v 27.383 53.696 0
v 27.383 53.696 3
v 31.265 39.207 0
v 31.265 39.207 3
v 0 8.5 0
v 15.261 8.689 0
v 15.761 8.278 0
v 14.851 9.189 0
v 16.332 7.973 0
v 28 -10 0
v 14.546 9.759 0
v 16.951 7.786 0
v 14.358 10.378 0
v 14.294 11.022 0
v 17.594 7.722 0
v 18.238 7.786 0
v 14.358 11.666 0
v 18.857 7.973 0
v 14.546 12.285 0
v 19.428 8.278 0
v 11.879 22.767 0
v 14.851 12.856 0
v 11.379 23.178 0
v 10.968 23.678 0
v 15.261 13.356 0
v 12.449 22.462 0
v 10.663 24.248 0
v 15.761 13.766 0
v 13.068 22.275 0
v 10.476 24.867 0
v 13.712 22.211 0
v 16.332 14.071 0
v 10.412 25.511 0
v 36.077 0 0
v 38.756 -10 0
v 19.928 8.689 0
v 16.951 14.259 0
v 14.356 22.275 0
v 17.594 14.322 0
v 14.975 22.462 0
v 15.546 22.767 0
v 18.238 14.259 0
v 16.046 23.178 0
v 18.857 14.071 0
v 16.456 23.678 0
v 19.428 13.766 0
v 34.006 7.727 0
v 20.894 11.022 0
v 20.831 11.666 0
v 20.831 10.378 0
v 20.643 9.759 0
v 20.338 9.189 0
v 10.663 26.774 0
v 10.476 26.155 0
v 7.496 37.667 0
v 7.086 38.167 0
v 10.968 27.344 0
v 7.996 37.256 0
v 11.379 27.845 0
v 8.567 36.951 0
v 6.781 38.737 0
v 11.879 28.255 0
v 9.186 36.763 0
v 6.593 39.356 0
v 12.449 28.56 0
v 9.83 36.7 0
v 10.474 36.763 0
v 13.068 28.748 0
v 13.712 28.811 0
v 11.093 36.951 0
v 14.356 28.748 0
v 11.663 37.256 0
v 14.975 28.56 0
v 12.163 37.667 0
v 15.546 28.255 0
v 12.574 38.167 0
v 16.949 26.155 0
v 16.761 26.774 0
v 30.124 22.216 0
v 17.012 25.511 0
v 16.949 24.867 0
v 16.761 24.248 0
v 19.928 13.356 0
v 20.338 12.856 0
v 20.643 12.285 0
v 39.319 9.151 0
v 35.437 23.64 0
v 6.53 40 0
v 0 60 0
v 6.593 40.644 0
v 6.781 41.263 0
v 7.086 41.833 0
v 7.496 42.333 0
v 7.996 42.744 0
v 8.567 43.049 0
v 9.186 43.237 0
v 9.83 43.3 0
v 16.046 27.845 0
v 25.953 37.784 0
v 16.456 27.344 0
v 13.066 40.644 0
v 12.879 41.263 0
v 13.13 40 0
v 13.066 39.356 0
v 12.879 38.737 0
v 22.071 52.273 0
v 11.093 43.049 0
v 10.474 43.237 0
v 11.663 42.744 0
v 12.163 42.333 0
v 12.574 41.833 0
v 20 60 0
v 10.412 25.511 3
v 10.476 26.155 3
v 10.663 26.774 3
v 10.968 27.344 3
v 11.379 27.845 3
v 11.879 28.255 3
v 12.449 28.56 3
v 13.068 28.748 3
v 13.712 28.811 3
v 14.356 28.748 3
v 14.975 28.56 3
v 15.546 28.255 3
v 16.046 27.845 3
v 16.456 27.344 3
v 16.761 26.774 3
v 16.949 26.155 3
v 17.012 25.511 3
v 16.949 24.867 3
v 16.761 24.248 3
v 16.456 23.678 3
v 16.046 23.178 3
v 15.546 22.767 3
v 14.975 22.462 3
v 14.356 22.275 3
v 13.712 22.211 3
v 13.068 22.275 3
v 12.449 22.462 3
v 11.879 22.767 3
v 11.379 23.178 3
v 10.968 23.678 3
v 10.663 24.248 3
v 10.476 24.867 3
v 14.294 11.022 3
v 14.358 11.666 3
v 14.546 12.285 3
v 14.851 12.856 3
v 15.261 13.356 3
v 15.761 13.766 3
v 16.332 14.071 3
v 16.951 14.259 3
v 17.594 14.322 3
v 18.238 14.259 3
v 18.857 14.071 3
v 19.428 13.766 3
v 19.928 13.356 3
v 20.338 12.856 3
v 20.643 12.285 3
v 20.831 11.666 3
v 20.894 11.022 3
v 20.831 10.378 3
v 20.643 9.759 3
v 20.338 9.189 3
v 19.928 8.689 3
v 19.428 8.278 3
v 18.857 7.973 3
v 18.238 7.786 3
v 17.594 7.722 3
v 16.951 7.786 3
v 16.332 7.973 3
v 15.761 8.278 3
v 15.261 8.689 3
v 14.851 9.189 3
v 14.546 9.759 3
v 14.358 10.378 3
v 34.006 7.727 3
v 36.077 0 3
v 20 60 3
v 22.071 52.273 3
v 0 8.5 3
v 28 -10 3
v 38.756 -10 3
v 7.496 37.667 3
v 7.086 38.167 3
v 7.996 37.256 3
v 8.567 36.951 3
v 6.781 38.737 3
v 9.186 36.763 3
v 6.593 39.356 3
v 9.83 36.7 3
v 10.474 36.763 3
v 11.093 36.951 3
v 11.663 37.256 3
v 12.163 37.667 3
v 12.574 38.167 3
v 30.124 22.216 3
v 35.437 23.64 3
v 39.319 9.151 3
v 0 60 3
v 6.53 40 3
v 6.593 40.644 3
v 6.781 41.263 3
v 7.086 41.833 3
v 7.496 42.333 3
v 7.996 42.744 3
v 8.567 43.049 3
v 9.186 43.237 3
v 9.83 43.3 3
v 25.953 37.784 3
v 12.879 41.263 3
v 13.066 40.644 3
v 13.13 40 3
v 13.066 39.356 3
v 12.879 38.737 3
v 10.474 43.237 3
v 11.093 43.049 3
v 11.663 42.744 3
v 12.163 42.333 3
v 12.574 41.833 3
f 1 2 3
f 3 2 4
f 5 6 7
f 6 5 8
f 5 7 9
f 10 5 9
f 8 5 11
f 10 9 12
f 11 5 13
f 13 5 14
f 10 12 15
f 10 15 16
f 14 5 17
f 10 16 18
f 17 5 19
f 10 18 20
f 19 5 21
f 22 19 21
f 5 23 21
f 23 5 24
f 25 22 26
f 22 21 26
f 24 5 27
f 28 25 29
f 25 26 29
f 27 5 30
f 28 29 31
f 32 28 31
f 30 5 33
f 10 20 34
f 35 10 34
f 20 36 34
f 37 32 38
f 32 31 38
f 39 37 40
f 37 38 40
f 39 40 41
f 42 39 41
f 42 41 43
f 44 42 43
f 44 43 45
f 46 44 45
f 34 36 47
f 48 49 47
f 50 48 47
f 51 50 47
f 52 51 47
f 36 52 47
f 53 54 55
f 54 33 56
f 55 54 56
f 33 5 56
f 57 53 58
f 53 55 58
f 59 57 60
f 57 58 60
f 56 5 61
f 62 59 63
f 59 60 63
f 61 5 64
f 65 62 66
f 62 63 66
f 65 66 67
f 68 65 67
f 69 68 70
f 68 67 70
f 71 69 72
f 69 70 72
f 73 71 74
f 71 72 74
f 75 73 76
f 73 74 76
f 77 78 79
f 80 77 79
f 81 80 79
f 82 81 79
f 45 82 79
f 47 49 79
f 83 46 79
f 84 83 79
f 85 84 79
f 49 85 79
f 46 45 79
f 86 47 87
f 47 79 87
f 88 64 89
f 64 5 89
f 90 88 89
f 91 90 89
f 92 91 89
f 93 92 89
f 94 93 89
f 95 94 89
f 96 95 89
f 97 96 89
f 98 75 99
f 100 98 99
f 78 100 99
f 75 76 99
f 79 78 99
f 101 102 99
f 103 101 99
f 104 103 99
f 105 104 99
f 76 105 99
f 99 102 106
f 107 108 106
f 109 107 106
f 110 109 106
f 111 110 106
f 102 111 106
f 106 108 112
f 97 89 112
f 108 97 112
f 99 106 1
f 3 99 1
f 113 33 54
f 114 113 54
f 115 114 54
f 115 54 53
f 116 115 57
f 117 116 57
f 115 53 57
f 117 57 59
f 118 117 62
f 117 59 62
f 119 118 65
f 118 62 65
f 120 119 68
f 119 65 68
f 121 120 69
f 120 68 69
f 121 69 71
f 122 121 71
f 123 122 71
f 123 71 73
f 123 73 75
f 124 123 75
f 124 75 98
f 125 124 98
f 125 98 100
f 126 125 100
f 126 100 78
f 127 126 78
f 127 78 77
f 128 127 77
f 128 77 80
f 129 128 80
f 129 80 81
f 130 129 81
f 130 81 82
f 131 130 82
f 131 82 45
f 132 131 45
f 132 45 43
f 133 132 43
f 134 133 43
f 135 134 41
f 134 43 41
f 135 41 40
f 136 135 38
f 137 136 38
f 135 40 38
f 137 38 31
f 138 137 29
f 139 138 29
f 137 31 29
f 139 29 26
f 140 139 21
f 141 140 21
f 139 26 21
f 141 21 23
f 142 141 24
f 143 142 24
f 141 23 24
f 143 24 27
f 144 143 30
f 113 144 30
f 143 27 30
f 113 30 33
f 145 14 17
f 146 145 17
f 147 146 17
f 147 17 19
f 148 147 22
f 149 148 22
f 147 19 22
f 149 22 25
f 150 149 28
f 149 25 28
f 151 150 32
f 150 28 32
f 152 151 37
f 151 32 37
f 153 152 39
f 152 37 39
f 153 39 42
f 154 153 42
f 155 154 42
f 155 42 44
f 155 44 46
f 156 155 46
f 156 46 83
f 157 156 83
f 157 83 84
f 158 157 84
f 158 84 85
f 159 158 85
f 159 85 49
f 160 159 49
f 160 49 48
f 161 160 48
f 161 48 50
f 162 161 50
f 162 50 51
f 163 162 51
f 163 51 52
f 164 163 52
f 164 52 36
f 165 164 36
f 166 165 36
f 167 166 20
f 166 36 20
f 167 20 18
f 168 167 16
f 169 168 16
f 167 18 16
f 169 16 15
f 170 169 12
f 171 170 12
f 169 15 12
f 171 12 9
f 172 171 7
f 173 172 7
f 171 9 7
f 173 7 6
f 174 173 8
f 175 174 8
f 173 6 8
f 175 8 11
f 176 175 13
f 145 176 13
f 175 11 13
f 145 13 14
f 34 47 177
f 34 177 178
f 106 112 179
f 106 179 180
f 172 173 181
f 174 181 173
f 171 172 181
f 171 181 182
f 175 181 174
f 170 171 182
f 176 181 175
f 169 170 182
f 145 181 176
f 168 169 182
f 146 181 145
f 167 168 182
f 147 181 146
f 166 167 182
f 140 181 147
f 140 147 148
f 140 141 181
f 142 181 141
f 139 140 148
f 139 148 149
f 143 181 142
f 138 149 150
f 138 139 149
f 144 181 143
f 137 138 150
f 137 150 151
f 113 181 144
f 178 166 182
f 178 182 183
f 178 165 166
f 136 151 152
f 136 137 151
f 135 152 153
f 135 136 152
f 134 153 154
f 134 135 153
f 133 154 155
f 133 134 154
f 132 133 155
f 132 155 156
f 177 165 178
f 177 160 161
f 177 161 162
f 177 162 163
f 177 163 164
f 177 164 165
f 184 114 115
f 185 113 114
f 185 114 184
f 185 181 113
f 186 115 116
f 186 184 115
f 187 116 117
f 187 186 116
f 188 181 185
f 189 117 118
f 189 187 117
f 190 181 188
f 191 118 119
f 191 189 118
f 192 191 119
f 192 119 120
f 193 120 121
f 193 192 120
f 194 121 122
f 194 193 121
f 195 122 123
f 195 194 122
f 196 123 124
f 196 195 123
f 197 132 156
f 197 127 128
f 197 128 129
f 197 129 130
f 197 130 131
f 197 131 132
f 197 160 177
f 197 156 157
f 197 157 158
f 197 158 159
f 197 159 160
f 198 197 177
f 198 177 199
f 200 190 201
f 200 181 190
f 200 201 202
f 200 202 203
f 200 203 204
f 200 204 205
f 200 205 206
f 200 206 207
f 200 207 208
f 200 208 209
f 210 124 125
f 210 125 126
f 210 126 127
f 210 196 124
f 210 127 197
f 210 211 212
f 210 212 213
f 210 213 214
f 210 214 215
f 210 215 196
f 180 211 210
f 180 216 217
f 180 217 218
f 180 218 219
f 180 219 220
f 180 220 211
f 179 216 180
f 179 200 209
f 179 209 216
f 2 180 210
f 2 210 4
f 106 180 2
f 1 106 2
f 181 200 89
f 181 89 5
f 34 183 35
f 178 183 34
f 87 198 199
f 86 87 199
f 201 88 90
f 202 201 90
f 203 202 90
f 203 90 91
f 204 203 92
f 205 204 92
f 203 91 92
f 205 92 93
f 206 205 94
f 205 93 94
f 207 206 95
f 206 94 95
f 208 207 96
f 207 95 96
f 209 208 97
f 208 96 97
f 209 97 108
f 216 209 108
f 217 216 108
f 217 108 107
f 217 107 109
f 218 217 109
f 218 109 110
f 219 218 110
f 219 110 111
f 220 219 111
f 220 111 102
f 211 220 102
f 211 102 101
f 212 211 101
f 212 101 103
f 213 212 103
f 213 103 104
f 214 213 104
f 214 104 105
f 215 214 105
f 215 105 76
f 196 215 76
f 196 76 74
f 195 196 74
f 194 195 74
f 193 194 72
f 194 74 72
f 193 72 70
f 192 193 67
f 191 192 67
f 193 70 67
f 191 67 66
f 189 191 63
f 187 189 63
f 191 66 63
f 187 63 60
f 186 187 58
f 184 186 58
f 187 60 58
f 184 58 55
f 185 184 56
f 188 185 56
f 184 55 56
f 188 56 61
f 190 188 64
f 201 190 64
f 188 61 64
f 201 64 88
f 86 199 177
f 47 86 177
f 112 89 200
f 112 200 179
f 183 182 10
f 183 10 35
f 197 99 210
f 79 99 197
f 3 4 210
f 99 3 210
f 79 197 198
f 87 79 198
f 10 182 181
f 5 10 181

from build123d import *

# Parameters (mm, degrees)
RESSALTO_EXTRUS_O1_DEPTH = 3
FURO_COM_FOLGA_DE_M61_D  = 6.6
RESSALTO_EXTRUS_O2_DEPTH = 3
RESSALTO_EXTRUS_O3_DEPTH = 3
CORTE_EXTRUS_O1_DEPTH    = 72.798210781


with BuildPart() as part:
    # Esboço1 → Ressalto-extrusão1 (new body)
    with BuildSketch(Plane.XY):
        Polygon((0, 0), (0, 60), (20, 60), (36.076951546, 0), align=None)
    extrude(amount=RESSALTO_EXTRUS_O1_DEPTH)

    # Furo com folga de M61 (through all)
    with Locations(Plane.XY.offset(3)):
        with Locations((9.829841142, 40), (13.712126819, 25.511112606), (17.594412496, 11.022225211)):
            Hole(FURO_COM_FOLGA_DE_M61_D / 2)

    # Esboço4 → Ressalto-extrusão2 (add)
    with BuildSketch(Plane.XY.offset(3)):
        Polygon((22.070552361, 52.27259339), (27.383144405, 53.696098138), (31.265430082, 39.207210743), (25.952838037, 37.783705995), align=None)
        Polygon((30.124113509, 22.216294005), (35.436705553, 23.639798753), (39.31899123, 9.150911358), (34.006399185, 7.72740661), align=None)
    extrude(amount=-RESSALTO_EXTRUS_O2_DEPTH)

    # Esboço5 → Ressalto-extrusão3 (add)
    with BuildSketch(Plane.XY.offset(3)):
        Polygon((0, 0), (0, -10), (38.75644347, -10), (36.076951546, 0), align=None)
    extrude(amount=-RESSALTO_EXTRUS_O3_DEPTH)

    # Esboço6 → Corte-extrusão1 (cut, through all)
    with BuildSketch(Plane.XY.offset(3)):
        Polygon((0, 8.5), (0, -10), (28, -10), align=None)
    extrude(amount=-CORTE_EXTRUS_O1_DEPTH, mode=Mode.SUBTRACT)


solid = part.part
